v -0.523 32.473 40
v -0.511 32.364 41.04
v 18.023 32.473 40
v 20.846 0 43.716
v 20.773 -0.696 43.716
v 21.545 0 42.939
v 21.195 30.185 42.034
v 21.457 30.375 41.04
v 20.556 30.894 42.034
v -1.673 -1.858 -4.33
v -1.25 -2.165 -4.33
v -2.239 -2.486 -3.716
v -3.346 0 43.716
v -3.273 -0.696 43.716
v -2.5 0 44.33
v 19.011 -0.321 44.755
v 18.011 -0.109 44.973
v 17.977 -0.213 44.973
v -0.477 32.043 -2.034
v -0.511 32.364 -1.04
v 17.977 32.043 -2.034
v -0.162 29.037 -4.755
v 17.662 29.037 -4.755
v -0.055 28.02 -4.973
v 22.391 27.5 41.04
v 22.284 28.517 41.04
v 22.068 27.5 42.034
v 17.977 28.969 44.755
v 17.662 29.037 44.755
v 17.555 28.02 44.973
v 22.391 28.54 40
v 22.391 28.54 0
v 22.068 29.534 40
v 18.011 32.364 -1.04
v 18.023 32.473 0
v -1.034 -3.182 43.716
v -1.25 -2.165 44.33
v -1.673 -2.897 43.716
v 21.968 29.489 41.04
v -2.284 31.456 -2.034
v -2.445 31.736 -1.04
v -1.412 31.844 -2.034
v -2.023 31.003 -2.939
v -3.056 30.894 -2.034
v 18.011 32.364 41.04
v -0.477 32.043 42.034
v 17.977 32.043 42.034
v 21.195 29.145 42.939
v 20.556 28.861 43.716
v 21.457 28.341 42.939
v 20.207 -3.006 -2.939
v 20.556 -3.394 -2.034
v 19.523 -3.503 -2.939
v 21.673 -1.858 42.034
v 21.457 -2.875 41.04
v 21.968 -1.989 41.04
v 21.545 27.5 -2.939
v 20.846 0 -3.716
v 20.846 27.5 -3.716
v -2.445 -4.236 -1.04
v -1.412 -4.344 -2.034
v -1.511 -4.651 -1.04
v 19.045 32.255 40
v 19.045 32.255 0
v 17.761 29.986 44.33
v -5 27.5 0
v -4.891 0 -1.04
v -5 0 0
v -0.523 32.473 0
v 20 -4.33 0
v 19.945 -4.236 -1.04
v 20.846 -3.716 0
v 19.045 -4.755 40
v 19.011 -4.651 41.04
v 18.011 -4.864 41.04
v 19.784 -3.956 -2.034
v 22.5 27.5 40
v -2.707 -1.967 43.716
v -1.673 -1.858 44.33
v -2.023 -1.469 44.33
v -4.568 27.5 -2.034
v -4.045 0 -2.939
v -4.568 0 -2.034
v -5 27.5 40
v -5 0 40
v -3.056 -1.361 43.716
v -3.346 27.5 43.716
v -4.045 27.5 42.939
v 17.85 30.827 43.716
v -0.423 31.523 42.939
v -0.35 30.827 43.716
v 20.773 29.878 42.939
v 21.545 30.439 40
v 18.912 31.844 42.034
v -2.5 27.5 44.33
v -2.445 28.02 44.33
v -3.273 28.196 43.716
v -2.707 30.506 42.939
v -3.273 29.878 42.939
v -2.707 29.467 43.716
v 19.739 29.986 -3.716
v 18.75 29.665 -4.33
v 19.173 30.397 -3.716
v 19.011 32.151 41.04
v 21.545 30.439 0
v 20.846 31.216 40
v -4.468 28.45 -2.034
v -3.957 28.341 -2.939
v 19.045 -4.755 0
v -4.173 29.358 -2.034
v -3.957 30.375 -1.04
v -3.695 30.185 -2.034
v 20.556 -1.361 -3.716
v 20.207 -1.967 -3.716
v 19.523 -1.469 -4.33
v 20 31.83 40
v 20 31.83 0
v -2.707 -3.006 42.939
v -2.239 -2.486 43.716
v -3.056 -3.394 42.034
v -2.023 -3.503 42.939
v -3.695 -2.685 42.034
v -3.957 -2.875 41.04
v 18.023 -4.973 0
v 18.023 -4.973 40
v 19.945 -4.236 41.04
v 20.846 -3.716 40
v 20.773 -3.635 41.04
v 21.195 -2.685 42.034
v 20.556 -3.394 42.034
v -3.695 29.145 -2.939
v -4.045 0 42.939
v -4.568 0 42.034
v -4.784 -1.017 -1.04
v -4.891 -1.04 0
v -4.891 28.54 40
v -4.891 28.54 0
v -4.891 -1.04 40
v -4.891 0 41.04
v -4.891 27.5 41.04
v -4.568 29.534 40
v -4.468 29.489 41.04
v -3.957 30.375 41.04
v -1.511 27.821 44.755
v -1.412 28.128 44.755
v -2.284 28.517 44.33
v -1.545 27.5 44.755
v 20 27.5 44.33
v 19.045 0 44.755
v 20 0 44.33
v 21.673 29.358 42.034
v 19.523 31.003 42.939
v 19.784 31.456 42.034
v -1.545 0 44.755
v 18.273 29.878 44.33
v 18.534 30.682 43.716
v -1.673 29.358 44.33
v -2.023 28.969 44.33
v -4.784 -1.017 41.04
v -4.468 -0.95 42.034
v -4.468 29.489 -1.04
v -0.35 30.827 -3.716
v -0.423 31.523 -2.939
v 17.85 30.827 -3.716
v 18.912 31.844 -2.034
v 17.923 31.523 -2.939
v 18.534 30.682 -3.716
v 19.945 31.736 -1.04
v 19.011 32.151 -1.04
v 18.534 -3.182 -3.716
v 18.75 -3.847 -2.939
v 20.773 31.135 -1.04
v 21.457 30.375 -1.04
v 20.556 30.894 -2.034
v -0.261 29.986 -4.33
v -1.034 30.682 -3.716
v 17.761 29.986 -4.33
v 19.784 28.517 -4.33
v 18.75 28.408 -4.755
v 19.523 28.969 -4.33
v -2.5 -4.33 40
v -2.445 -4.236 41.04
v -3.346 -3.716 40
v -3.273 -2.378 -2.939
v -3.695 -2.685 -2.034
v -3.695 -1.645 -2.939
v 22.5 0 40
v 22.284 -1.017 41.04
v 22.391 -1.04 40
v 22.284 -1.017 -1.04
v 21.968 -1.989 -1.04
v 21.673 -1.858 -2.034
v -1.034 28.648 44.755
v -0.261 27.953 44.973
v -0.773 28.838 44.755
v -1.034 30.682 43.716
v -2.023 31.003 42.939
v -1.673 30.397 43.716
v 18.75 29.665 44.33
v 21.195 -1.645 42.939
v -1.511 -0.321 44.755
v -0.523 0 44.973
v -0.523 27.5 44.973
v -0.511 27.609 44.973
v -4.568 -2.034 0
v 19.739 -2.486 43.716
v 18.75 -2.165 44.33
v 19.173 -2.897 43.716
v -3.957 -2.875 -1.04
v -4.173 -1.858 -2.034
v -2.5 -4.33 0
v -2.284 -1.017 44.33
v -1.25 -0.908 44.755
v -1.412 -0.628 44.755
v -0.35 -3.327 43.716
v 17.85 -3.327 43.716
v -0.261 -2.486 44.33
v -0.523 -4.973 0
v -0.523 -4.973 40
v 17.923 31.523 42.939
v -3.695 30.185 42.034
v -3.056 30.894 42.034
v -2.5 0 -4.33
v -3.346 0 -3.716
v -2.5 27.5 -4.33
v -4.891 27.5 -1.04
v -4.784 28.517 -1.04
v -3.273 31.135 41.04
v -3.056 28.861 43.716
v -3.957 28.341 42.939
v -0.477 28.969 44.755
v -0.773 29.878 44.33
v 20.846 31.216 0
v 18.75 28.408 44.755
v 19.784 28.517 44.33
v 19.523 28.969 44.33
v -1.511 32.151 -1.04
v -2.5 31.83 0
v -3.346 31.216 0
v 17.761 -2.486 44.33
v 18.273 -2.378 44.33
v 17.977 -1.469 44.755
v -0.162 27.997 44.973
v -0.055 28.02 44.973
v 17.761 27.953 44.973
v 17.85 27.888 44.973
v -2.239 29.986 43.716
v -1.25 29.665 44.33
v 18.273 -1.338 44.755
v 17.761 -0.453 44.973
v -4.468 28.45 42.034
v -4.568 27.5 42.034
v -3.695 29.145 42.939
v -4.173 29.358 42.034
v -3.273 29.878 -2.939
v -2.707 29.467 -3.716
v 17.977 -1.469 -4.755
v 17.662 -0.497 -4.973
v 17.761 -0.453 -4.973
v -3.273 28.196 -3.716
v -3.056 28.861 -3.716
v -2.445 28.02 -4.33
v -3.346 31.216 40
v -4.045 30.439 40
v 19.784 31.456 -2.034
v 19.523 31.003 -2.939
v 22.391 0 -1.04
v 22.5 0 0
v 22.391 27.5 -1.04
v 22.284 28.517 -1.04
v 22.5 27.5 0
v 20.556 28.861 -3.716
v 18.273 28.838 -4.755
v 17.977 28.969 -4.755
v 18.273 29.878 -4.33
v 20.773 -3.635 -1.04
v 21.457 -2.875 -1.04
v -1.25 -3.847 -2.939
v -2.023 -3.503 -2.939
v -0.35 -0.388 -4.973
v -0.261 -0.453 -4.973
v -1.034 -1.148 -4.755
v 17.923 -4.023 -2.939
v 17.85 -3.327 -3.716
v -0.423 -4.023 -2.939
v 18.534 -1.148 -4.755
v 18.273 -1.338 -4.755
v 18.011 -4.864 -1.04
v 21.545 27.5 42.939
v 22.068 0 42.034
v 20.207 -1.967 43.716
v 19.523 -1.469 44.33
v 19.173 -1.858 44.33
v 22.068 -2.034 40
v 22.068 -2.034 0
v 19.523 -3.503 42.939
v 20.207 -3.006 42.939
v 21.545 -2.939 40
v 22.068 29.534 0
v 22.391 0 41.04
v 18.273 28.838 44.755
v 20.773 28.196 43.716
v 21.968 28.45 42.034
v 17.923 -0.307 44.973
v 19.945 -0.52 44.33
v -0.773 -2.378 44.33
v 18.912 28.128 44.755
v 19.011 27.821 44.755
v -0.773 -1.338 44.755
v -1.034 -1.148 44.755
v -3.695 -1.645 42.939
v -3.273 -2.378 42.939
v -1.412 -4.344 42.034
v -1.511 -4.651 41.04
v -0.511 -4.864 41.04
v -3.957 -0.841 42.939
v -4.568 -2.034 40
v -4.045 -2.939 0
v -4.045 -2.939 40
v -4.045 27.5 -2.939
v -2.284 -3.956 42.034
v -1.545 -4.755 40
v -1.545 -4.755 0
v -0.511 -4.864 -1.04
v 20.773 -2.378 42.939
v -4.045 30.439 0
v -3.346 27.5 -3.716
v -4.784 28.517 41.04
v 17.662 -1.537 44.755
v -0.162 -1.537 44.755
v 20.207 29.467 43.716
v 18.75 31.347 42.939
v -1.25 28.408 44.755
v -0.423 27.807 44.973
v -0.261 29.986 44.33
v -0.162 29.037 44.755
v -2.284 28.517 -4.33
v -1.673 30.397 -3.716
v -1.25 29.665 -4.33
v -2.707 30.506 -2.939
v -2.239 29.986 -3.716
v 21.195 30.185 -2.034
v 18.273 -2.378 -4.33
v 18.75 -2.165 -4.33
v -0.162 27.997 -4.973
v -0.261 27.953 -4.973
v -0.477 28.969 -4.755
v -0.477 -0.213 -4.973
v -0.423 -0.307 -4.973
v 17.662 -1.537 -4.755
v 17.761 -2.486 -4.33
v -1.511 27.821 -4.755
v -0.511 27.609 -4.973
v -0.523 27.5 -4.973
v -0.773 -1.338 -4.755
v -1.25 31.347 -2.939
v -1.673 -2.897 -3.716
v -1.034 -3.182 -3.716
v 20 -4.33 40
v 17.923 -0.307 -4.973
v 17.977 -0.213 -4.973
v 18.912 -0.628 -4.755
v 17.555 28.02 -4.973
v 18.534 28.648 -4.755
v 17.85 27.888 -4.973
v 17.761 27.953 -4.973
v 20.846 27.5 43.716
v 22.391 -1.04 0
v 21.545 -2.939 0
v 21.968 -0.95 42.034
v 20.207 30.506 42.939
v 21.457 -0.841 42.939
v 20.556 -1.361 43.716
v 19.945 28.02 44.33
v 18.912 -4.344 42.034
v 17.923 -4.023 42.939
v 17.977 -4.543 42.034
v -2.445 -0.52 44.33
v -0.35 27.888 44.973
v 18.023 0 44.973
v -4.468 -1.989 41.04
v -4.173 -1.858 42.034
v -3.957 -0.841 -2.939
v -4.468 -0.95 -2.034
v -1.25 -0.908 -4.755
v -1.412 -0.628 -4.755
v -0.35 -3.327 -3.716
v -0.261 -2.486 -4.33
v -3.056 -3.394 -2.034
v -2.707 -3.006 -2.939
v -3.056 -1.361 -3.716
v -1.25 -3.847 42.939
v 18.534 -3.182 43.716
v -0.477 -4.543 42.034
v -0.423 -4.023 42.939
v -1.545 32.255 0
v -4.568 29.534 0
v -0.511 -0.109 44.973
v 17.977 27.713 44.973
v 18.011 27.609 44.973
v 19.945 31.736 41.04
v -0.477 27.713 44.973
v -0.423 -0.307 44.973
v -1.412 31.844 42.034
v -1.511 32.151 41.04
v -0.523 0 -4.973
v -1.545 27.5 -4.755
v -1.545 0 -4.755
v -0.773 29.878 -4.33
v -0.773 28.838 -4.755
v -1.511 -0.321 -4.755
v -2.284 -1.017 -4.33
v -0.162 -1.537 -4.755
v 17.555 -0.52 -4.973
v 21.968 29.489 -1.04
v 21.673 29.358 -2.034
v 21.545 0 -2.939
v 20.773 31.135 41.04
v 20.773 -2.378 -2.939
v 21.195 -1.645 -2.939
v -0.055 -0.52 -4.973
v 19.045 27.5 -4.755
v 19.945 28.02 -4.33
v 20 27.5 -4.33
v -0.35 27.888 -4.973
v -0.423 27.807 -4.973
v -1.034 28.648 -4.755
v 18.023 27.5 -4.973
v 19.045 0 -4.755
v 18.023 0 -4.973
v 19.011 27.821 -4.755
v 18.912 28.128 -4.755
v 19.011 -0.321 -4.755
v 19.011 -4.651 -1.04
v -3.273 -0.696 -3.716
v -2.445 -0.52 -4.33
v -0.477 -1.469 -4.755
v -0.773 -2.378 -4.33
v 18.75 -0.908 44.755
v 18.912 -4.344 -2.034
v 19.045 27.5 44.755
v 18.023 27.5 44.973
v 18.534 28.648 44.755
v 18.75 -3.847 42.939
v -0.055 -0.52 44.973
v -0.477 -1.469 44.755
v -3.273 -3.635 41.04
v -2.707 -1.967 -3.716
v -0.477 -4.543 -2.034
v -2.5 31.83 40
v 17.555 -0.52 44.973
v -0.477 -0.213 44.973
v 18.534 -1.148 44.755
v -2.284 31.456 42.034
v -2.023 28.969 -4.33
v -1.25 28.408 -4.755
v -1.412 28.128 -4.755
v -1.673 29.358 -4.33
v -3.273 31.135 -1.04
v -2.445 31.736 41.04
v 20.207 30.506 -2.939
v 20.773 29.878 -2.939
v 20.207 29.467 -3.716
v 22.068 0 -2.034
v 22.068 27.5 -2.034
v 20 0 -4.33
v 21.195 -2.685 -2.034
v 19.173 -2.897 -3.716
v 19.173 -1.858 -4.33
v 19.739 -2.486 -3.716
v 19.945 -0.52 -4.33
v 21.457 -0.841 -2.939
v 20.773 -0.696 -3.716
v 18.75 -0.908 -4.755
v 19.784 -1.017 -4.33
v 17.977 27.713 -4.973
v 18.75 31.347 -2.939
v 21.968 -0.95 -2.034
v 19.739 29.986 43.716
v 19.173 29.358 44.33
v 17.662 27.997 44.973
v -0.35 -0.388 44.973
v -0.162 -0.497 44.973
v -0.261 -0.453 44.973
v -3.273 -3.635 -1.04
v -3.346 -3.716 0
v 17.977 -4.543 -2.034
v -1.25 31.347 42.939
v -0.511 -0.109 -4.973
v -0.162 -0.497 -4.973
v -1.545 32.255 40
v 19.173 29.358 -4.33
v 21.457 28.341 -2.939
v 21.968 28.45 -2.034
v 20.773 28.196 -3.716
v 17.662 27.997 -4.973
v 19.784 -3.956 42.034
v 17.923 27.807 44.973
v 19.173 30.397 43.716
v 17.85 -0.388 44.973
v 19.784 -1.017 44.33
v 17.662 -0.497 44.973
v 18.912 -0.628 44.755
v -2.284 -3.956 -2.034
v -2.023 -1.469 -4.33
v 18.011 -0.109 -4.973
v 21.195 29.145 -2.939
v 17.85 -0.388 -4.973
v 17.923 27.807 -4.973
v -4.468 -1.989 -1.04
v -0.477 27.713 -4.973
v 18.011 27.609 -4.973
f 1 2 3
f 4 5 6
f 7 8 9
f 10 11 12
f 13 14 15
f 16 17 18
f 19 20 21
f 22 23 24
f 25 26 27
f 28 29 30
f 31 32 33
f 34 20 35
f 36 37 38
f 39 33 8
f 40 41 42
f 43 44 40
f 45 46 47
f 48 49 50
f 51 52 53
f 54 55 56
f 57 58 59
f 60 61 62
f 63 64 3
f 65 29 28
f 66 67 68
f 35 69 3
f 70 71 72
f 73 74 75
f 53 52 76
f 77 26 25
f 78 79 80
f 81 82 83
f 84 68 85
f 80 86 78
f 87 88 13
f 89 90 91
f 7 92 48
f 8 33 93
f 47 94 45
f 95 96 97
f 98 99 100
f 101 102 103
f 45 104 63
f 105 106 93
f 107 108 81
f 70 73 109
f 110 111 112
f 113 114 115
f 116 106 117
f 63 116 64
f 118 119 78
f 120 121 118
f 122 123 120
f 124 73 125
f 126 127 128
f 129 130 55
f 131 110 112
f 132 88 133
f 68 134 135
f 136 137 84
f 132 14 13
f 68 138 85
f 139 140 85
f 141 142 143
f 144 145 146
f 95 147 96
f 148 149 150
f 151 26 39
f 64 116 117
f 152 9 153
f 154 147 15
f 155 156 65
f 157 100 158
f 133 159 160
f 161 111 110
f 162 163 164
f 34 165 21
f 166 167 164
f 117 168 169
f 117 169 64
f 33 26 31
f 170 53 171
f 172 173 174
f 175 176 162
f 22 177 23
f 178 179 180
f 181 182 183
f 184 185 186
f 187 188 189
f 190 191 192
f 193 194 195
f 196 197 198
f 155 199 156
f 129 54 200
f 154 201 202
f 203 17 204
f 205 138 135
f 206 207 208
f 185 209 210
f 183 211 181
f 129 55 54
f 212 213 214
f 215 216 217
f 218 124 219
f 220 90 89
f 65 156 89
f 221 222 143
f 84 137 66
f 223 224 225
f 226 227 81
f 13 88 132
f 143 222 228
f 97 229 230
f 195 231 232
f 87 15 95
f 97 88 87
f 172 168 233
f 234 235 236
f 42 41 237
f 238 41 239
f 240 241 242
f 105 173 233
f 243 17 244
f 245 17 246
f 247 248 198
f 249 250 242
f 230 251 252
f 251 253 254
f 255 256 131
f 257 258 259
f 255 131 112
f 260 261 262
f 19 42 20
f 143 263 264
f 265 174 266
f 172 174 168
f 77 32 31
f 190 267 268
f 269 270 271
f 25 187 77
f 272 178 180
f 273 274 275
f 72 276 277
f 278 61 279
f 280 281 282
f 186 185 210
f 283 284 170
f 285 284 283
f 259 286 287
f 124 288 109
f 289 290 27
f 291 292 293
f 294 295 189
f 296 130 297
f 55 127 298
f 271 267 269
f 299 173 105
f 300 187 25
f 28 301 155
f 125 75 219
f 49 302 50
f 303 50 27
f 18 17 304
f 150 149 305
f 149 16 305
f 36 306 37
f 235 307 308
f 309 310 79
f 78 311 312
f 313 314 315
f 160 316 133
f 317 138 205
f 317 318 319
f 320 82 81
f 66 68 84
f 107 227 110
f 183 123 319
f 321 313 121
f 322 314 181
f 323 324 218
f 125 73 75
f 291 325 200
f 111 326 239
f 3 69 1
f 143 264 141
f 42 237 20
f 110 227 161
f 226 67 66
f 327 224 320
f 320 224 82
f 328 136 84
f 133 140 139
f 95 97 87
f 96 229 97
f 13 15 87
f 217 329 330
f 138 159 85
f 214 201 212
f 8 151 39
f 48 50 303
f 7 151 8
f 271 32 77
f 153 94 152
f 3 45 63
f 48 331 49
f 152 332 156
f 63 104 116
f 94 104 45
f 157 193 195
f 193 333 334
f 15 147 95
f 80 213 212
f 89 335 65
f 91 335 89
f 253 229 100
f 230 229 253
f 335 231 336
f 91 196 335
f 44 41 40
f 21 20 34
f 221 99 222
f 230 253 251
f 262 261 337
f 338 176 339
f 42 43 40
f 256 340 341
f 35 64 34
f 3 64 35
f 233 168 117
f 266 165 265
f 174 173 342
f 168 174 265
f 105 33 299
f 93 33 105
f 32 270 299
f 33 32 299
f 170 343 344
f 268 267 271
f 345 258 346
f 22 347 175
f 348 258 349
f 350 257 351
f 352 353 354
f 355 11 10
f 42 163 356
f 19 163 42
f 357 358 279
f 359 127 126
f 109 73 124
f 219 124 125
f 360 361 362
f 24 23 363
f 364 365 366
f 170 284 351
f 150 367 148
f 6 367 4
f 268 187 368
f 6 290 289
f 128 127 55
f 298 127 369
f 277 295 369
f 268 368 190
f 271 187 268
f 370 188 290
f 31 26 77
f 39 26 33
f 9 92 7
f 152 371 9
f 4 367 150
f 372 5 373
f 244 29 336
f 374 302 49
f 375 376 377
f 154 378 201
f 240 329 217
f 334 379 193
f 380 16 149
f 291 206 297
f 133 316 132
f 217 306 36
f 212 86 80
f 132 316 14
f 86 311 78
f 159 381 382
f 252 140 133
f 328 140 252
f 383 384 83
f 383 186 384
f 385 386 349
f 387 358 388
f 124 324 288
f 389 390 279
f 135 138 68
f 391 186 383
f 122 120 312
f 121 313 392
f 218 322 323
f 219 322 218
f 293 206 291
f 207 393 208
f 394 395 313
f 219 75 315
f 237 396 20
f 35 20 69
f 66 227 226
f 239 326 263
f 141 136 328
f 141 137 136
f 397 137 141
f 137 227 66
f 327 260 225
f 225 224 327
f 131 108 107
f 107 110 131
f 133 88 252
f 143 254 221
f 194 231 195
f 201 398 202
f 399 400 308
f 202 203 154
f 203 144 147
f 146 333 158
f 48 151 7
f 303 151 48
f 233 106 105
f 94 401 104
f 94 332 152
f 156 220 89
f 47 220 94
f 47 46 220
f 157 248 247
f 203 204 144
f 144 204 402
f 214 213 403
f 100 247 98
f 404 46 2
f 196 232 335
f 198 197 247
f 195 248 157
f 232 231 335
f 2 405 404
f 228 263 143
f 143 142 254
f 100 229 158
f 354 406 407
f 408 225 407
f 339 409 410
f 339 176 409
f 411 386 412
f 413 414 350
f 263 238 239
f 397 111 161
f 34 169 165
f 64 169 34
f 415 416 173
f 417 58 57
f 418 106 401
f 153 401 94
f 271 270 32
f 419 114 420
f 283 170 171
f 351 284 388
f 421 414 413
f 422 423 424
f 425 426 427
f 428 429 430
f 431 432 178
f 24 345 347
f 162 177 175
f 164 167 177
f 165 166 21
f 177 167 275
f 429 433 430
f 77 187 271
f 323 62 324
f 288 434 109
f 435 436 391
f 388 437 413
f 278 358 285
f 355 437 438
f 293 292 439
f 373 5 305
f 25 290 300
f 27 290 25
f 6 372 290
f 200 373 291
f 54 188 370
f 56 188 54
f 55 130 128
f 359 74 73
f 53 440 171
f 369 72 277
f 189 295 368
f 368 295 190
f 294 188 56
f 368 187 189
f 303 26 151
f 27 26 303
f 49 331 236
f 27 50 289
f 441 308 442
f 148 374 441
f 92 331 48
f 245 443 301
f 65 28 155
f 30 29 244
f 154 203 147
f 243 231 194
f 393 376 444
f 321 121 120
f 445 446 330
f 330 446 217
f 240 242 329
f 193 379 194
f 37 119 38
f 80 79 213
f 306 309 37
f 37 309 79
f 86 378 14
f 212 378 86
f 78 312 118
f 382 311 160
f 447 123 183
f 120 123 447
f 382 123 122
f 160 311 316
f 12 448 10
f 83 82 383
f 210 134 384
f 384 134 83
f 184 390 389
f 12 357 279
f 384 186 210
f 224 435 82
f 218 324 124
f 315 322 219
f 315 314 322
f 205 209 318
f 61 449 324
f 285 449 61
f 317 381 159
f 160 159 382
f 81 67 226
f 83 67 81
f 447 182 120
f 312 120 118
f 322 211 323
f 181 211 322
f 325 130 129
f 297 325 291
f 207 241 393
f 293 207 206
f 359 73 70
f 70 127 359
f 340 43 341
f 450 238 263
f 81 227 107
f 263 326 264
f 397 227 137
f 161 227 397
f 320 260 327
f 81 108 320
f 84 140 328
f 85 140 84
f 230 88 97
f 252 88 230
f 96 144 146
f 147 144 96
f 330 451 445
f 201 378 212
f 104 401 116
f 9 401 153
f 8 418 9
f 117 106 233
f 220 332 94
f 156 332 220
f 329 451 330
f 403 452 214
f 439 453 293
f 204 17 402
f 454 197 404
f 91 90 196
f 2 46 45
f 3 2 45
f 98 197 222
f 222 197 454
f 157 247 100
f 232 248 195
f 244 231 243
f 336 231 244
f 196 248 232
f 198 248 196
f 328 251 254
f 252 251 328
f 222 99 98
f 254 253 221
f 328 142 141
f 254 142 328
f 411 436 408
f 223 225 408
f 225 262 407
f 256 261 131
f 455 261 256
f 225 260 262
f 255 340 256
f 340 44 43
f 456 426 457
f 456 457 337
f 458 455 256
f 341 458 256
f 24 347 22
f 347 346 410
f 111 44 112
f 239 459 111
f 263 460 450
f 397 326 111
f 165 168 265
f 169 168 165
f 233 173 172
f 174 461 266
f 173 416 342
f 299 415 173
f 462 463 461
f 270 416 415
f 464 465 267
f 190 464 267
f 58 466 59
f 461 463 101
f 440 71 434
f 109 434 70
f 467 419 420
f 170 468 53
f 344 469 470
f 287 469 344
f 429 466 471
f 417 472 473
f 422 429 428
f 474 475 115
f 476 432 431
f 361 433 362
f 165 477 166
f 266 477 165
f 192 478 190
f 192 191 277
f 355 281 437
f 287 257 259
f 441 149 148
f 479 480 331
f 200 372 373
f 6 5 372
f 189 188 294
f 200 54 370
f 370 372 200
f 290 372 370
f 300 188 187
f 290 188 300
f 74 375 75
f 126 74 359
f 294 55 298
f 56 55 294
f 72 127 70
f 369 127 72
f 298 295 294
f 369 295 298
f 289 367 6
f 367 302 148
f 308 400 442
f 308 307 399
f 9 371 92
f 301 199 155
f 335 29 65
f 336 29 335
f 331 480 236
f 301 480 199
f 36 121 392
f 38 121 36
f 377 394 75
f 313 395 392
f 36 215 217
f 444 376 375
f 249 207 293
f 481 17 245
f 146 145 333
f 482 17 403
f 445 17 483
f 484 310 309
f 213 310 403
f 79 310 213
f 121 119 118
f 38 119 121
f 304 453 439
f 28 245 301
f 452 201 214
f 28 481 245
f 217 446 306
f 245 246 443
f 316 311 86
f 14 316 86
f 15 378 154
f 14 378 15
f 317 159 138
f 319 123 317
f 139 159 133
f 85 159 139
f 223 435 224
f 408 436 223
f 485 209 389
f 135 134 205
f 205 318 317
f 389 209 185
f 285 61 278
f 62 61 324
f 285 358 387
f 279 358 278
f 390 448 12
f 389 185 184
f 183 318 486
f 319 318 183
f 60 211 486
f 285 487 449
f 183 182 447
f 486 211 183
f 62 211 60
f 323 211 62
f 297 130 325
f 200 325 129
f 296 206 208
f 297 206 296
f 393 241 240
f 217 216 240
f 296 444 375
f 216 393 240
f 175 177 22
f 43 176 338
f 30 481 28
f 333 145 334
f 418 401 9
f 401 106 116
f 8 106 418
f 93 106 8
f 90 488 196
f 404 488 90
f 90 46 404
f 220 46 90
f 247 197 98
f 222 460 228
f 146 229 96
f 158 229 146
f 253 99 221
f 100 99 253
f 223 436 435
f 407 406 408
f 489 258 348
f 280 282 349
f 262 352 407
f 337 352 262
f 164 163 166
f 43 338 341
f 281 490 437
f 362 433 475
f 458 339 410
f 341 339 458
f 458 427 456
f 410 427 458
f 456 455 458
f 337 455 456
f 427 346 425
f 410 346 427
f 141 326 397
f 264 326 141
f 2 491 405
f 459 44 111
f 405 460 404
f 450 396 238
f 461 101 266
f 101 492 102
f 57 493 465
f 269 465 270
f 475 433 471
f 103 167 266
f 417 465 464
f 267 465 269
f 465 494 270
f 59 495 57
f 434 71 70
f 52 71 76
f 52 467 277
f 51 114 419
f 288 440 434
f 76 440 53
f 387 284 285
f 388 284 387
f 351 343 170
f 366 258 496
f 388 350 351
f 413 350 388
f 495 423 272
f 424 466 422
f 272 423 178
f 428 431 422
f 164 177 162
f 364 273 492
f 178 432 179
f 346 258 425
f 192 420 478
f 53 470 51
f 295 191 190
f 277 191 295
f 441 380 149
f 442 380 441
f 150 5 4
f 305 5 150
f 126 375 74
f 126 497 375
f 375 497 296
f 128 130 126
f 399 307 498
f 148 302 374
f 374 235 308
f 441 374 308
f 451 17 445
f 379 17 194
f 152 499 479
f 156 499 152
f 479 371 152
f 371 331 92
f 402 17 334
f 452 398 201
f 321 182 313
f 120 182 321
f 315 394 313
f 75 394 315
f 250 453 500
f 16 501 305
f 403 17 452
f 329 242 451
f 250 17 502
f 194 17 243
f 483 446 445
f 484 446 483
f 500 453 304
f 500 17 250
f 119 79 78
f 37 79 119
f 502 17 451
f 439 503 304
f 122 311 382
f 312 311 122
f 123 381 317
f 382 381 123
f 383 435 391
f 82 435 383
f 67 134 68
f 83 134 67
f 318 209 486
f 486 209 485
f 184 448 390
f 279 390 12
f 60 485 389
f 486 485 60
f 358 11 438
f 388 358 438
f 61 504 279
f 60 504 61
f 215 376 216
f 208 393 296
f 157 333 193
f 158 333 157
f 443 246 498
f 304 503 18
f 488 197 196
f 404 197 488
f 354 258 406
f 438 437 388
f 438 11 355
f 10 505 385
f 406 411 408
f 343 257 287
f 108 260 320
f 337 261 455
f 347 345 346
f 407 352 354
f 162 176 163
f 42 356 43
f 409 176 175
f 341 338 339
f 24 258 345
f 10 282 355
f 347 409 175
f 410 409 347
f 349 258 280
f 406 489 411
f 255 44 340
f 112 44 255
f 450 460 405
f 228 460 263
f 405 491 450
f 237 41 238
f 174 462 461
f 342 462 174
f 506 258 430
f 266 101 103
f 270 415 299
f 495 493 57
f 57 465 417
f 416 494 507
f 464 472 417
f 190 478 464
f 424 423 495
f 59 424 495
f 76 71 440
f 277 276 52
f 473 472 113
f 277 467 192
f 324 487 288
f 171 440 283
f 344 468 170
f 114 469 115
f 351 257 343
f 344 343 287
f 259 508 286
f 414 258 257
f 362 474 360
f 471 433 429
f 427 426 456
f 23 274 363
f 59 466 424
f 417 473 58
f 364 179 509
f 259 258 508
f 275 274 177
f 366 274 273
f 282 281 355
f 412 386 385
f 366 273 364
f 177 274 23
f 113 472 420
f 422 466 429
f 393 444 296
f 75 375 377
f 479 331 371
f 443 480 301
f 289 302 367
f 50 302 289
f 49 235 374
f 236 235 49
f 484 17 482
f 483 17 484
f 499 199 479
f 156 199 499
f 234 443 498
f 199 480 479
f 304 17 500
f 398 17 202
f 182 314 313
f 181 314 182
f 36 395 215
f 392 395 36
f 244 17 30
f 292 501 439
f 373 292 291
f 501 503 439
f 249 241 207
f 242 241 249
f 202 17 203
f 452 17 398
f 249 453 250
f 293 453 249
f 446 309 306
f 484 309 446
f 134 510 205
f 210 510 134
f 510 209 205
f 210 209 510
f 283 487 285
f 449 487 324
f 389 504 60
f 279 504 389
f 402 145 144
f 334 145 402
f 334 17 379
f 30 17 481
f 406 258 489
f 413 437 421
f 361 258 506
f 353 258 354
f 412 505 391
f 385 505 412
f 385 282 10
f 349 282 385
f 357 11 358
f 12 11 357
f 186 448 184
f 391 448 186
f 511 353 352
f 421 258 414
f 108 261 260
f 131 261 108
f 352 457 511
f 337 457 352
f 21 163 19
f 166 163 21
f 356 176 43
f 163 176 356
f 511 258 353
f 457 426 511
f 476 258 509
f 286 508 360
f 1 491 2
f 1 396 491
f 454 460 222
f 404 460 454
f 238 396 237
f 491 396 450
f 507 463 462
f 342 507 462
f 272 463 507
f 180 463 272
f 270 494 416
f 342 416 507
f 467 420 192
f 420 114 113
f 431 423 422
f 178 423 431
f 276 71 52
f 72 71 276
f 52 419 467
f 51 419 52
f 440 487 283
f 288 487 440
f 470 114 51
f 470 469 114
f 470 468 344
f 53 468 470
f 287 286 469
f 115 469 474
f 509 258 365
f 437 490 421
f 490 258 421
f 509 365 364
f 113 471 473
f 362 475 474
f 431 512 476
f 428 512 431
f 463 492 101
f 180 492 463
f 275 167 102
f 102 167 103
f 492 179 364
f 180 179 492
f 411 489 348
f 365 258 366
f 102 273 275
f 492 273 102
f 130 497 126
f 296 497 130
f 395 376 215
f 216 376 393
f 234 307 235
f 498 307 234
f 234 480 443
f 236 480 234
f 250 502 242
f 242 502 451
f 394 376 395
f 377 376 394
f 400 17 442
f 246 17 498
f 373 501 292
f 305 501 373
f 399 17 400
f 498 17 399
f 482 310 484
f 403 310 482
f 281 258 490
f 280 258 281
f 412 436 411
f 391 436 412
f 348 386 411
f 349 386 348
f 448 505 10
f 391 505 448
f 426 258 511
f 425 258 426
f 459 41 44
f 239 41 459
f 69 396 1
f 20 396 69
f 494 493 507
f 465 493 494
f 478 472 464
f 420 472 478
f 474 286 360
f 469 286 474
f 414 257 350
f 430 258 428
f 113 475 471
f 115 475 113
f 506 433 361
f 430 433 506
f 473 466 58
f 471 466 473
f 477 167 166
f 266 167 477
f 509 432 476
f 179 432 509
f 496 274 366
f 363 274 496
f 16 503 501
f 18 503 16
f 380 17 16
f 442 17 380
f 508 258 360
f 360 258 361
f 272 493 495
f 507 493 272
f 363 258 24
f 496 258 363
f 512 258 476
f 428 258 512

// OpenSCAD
/**

	Source code source:
	
		http://www.thingiverse.com/thing:9347
		
*/

// You could simply do it this way if you have the boxes.scad
// file in your library
//use <boxes.scad>
//roundedBox([20, 30, 40], 5, true); 

// Or, you could do it this way if you want to roll your own
// THIS ONE
//roundedRect([20, 30, 40], 5, $fn=12);

miniround([20, 30, 40], 5, $fn=12);

// size - [x,y,z]
// radius - radius of corners
module roundedRect(size, radius)
{
	x = size[0];
	y = size[1];
	z = size[2];

	linear_extrude(height=z)
	hull()
	{
		// place 4 circles in the corners, with the given radius
		translate([(-x/2)+(radius/2), (-y/2)+(radius/2), 0])
		circle(r=radius);
	
		translate([(x/2)-(radius/2), (-y/2)+(radius/2), 0])
		circle(r=radius);
	
		translate([(-x/2)+(radius/2), (y/2)-(radius/2), 0])
		circle(r=radius);
	
		translate([(x/2)-(radius/2), (y/2)-(radius/2), 0])
		circle(r=radius);
	}
}		

/**
 * makes a rounded cube
 */
module miniround(size, radius, sides=30)
{
	$fn=sides;
	x = size[0]-radius/2;
	y = size[1]-radius/2;
	
	minkowski(size, radius)
	{
	    cube(size=[x,y,size[2]]);
	//    cylinder(r=radius);
	    // Using a sphere is possible, but will kill performance
	    sphere(r=radius);
	}
}
